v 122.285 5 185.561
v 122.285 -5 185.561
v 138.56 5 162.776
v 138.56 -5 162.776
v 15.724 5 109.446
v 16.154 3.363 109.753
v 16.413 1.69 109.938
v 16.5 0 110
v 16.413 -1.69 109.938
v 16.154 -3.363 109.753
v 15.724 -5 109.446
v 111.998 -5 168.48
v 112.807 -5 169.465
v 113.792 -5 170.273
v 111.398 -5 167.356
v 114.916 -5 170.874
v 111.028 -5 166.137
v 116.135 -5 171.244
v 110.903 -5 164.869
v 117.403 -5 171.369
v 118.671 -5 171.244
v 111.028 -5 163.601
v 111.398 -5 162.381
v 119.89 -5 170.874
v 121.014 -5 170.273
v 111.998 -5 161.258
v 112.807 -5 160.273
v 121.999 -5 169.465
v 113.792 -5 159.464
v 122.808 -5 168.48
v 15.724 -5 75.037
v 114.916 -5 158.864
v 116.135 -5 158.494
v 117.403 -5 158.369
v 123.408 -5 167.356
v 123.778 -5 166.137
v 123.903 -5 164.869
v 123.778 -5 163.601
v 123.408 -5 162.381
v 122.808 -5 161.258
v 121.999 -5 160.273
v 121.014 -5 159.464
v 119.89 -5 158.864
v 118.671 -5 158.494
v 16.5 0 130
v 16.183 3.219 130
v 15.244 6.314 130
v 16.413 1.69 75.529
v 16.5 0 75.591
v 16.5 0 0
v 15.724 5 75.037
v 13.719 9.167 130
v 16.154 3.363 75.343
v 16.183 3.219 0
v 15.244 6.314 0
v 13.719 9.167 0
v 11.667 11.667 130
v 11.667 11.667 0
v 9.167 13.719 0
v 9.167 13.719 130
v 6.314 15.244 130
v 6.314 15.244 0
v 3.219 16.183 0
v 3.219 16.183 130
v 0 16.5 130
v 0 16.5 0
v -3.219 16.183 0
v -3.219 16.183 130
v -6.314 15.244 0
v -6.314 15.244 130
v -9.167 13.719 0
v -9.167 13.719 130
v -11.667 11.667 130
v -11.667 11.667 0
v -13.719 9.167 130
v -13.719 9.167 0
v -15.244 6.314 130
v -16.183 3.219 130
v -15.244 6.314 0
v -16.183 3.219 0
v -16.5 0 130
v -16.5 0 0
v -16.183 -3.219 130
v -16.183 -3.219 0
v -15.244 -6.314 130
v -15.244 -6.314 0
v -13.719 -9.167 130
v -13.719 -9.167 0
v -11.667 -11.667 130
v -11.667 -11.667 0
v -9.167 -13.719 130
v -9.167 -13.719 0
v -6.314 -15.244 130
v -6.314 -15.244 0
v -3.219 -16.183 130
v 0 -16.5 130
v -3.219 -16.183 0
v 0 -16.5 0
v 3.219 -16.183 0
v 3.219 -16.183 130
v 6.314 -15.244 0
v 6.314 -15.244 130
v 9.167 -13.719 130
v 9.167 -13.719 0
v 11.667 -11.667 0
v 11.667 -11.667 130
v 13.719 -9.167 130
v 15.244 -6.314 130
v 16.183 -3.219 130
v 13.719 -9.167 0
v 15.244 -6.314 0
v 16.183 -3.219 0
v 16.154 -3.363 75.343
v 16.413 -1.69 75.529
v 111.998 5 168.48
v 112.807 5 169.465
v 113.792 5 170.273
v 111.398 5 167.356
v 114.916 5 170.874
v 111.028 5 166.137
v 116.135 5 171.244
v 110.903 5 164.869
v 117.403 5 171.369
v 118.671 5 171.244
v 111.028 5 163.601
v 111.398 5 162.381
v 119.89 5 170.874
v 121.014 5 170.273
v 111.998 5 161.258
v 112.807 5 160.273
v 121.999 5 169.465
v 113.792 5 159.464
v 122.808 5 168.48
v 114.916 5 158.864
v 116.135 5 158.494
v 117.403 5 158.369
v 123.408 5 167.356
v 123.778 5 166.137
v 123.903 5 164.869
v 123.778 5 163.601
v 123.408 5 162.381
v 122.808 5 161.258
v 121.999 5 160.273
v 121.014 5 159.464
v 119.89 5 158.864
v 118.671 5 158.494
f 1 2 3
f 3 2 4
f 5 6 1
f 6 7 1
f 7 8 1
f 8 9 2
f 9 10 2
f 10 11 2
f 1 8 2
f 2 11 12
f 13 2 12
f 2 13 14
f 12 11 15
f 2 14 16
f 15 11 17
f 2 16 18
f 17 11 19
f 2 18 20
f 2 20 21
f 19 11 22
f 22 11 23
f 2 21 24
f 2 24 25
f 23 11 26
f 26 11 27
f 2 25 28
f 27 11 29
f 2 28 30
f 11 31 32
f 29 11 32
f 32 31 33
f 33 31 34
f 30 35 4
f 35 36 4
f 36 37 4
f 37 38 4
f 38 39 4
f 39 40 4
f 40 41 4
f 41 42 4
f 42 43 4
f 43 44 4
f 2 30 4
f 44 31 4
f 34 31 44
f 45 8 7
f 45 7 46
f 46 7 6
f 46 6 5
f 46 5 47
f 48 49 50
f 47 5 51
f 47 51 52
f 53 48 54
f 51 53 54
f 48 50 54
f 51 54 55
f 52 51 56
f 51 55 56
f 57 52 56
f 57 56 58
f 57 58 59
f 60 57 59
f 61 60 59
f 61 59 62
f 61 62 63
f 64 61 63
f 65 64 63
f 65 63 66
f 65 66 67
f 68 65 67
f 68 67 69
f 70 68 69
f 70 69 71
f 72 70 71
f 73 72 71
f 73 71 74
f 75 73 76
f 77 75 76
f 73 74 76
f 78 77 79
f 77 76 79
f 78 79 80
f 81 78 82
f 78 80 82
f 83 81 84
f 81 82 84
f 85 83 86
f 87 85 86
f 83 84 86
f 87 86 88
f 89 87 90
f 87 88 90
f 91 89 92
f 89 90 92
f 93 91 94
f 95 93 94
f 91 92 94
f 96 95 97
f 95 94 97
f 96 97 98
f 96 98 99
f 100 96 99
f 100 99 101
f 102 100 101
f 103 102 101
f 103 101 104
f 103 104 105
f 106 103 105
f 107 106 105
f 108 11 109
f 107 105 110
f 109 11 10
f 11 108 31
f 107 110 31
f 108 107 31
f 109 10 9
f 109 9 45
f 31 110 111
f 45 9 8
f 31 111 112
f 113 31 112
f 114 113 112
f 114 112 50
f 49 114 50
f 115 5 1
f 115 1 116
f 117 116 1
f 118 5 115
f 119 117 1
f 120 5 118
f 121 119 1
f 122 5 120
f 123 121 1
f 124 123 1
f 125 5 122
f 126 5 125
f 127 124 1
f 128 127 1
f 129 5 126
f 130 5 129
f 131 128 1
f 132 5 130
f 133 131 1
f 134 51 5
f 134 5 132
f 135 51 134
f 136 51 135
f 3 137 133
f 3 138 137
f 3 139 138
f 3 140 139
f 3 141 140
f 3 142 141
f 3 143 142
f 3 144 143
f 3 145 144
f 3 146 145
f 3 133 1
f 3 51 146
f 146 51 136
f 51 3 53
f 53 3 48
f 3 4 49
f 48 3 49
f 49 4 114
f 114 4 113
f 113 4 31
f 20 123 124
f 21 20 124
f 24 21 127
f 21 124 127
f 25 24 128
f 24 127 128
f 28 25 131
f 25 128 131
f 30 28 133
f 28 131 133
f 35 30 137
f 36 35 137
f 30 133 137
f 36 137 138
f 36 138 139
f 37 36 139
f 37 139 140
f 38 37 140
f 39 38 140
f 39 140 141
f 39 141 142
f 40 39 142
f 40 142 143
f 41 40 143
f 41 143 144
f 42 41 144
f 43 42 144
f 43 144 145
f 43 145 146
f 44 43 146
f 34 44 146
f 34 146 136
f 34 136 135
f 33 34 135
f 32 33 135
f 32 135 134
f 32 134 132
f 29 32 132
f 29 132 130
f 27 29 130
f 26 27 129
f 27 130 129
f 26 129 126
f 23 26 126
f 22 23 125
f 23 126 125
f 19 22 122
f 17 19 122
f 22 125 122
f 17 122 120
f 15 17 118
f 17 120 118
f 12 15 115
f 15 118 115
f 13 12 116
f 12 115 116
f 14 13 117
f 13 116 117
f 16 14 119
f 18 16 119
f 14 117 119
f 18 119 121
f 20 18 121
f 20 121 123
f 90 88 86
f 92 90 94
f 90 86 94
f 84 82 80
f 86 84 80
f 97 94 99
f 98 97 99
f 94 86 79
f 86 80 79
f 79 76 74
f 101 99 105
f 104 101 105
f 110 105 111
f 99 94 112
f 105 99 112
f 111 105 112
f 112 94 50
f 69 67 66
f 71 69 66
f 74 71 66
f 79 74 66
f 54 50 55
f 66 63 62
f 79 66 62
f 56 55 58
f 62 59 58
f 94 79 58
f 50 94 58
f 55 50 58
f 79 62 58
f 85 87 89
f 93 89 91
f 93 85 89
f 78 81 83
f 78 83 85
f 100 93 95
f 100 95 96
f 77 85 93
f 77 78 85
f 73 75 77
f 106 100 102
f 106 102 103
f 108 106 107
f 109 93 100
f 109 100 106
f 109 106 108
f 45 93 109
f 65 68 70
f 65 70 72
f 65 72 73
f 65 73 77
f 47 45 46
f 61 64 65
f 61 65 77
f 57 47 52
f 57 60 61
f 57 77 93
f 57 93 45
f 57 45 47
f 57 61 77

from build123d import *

# Parameters (mm, degrees)
SKETCH1_R                = 16.5
BOSS_EXTRUDE1_DEPTH      = 130
BOSS_EXTRUDE2_DEPTH      = 5
BOSS_EXTRUDE2_DEPTH_BACK = 5
SKETCH3_R                = 6.5
CUT_EXTRUDE1_DEPTH       = 20


with BuildPart() as part:
    # Sketch1 → Boss-Extrude1 (new body)
    with BuildSketch(Plane.XY):
        Circle(SKETCH1_R)
    extrude(amount=BOSS_EXTRUDE1_DEPTH)

    # Sketch2 → Boss-Extrude2 (add, two sides: drawn at the far end of the back side and taken through both)
    with BuildSketch(Plane(origin=(0, 0, 0), x_dir=(1, 0, 0), z_dir=(0, 1, 0)).offset(-BOSS_EXTRUDE2_DEPTH_BACK)):
        Polygon((0, -98.214285714), (122.285351257, -185.560965183), (138.560020681, -162.77642799), (0, -63.804984646), align=None)
    extrude(amount=BOSS_EXTRUDE2_DEPTH + BOSS_EXTRUDE2_DEPTH_BACK)

    # Sketch3 → Cut-Extrude1 (cut)
    with BuildSketch(Plane(origin=(0, 5, 0), x_dir=(1, 0, 0), z_dir=(0, 1, 0))):
        with Locations((117.40295043, -164.868885487)):
            Circle(SKETCH3_R)
    extrude(amount=-CUT_EXTRUDE1_DEPTH, mode=Mode.SUBTRACT)


solid = part.part
